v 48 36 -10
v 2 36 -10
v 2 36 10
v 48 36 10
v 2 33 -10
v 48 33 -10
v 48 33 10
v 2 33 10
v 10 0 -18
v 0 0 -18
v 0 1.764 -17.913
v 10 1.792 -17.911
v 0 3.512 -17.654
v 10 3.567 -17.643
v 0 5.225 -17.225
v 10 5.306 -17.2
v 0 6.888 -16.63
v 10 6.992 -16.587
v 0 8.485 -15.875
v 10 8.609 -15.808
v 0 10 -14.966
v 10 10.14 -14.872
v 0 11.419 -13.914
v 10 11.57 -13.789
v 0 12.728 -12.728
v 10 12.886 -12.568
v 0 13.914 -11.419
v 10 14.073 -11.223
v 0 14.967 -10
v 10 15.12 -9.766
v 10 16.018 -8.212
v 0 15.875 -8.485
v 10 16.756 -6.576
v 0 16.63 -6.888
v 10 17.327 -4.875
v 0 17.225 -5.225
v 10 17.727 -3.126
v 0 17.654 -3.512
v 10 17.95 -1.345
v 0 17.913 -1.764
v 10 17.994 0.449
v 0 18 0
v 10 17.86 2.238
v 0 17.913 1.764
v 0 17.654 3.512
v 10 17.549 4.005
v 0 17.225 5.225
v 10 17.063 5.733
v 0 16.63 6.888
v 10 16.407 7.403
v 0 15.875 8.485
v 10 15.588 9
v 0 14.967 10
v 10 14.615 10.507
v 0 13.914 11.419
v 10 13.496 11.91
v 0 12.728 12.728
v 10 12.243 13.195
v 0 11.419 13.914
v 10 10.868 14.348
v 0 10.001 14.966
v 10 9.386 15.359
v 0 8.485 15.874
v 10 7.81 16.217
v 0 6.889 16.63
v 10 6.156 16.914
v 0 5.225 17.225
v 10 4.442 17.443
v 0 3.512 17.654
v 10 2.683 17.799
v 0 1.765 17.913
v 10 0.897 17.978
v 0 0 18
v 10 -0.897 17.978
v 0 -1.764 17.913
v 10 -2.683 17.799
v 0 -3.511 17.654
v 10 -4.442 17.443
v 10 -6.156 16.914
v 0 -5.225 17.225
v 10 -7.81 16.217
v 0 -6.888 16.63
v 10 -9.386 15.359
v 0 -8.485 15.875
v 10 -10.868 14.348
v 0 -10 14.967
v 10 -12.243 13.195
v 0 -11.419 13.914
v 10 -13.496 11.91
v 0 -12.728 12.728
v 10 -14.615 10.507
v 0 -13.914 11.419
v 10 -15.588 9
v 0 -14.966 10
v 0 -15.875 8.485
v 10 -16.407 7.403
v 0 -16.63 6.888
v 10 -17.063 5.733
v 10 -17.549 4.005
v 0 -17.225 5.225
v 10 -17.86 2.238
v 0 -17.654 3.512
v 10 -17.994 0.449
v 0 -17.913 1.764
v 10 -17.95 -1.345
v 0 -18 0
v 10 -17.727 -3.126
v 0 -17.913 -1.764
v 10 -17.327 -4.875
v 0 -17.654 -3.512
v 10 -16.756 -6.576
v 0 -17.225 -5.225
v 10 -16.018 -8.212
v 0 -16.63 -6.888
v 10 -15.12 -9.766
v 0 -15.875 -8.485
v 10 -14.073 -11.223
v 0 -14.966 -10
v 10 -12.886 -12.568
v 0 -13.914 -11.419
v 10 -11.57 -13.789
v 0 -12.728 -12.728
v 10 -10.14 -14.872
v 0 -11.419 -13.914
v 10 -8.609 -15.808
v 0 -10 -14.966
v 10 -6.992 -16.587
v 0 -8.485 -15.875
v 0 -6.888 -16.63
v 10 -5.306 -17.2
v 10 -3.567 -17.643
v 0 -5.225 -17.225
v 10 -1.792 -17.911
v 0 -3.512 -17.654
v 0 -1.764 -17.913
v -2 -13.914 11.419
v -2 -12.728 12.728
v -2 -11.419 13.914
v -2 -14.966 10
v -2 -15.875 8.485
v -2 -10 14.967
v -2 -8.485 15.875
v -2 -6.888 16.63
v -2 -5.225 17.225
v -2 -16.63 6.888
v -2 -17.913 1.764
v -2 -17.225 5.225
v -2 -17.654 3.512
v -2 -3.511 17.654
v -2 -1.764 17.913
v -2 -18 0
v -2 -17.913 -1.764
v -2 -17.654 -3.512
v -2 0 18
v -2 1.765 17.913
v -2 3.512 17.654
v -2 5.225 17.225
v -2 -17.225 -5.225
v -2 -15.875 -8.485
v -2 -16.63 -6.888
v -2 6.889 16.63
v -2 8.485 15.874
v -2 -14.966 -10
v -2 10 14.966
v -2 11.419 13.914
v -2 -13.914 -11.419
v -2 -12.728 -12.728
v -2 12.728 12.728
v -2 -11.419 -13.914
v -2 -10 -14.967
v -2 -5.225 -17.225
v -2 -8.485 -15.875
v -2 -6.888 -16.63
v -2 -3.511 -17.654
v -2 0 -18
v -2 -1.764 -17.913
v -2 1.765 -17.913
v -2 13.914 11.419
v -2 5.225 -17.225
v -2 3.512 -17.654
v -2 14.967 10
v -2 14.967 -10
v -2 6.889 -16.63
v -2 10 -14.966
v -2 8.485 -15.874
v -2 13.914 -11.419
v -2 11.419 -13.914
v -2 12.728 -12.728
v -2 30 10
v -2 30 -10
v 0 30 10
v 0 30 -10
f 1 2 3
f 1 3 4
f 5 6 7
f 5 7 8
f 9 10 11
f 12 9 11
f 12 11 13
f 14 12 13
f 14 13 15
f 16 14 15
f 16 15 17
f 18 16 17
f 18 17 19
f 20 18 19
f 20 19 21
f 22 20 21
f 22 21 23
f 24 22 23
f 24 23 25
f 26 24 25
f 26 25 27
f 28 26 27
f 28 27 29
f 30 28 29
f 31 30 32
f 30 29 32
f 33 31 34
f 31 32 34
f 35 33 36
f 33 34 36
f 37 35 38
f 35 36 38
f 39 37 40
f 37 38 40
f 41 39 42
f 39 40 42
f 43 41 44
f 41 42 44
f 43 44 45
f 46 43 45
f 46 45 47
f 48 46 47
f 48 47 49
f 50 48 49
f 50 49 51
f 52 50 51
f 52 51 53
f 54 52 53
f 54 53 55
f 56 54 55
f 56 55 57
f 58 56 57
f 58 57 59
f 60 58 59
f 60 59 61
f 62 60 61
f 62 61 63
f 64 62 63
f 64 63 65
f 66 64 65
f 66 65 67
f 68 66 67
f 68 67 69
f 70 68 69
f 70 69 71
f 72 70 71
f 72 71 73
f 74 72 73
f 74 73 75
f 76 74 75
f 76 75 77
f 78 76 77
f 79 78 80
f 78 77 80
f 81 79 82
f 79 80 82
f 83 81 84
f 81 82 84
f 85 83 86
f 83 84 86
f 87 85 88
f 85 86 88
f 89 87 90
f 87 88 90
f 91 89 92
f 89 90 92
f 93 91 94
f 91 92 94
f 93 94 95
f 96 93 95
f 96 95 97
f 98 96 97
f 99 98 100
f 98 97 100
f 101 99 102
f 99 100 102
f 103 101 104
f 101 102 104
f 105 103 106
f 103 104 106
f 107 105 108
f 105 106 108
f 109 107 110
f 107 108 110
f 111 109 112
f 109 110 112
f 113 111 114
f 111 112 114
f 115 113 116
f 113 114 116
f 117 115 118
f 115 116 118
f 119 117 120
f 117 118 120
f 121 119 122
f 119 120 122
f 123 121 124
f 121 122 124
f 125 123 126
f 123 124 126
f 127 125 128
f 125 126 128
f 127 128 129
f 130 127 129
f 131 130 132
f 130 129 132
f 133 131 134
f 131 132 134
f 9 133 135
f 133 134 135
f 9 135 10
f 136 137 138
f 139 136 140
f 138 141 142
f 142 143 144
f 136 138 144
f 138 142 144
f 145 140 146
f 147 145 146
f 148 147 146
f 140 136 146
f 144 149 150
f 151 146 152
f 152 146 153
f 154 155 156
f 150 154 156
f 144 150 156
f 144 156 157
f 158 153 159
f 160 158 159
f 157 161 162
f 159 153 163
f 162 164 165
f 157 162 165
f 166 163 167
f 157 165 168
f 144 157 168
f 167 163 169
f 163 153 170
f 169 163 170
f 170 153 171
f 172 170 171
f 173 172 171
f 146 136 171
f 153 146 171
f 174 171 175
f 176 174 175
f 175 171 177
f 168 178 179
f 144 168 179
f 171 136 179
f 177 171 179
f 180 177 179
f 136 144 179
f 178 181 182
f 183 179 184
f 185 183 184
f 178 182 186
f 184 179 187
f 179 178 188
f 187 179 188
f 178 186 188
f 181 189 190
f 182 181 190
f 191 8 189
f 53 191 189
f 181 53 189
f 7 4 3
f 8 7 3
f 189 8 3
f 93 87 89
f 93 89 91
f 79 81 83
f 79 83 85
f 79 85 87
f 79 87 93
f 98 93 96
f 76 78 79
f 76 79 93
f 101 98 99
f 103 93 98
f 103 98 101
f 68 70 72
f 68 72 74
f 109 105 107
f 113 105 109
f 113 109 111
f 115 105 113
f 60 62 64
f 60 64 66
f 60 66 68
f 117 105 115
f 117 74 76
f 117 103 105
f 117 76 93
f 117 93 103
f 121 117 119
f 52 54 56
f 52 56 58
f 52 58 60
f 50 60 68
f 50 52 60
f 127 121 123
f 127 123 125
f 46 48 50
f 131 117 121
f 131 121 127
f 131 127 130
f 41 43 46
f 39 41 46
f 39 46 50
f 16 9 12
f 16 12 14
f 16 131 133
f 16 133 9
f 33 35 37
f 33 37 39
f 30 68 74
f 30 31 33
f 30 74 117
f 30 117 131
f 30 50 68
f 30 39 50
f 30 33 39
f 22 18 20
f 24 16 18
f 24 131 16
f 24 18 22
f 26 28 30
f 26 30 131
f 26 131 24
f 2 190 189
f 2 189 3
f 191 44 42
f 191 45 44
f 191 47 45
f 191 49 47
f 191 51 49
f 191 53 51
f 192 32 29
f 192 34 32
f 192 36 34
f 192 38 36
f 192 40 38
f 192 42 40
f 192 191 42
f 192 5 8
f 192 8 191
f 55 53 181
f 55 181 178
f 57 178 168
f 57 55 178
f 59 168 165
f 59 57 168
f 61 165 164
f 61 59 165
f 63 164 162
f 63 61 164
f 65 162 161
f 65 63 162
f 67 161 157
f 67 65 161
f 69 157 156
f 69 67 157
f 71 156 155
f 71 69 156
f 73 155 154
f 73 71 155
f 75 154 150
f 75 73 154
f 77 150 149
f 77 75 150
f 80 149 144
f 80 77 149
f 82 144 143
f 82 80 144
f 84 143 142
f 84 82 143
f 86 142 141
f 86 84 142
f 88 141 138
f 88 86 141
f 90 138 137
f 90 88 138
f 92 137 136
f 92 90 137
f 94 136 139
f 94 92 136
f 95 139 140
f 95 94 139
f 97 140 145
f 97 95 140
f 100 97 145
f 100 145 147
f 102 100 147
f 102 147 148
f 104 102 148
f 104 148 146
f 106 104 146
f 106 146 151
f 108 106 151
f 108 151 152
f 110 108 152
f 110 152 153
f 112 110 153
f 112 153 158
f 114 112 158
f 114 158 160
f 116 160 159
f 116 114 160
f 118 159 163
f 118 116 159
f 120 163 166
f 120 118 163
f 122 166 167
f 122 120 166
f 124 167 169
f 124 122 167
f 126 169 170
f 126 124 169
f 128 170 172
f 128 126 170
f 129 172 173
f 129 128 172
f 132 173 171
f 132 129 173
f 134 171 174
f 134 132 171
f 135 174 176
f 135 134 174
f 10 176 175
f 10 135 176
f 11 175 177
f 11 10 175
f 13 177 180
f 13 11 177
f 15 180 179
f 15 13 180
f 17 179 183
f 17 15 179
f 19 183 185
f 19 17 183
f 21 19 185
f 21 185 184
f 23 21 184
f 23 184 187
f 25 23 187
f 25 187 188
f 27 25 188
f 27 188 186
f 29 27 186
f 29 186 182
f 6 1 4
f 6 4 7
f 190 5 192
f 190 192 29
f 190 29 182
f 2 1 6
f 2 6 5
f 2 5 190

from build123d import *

# Parameters (mm, degrees)
SKETCH1_R           = 18
BOSS_EXTRUDE1_DEPTH = 10
BOSS_EXTRUDE2_DEPTH = 2
BOSS_EXTRUDE4_DEPTH = 20


with BuildPart() as part:
    # Sketch1 → Boss-Extrude1 (new body)
    with BuildSketch(Plane(origin=(0, 0, 0), x_dir=(0, 0, -1), z_dir=(1, 0, 0))):
        Circle(SKETCH1_R)
    extrude(amount=BOSS_EXTRUDE1_DEPTH)

    # Sketch2 → Boss-Extrude2 (add)
    with BuildSketch(Plane.ZY):
        with BuildLine():
            Line((-10, 14.966629547), (-10, 30))
            Line((-10, 30), (10, 30))
            Line((10, 30), (10, 14.966629547))
            ThreePointArc((10, 14.966629547), (0, -18), (-10, 14.966629547))
        make_face()
    extrude(amount=BOSS_EXTRUDE2_DEPTH)

    # Sketch5 → Boss-Extrude4 (add)
    with BuildSketch(Plane(origin=(0, 0, -10), x_dir=(-1, 0, 0), z_dir=(0, 0, -1))):
        Polygon((-2, 36), (-48, 36), (-48, 33), (-2, 33), (0, 30), (0, 14.966629547), (2, 14.966629547), (2, 30), align=None)
    extrude(amount=-BOSS_EXTRUDE4_DEPTH)


solid = part.part
